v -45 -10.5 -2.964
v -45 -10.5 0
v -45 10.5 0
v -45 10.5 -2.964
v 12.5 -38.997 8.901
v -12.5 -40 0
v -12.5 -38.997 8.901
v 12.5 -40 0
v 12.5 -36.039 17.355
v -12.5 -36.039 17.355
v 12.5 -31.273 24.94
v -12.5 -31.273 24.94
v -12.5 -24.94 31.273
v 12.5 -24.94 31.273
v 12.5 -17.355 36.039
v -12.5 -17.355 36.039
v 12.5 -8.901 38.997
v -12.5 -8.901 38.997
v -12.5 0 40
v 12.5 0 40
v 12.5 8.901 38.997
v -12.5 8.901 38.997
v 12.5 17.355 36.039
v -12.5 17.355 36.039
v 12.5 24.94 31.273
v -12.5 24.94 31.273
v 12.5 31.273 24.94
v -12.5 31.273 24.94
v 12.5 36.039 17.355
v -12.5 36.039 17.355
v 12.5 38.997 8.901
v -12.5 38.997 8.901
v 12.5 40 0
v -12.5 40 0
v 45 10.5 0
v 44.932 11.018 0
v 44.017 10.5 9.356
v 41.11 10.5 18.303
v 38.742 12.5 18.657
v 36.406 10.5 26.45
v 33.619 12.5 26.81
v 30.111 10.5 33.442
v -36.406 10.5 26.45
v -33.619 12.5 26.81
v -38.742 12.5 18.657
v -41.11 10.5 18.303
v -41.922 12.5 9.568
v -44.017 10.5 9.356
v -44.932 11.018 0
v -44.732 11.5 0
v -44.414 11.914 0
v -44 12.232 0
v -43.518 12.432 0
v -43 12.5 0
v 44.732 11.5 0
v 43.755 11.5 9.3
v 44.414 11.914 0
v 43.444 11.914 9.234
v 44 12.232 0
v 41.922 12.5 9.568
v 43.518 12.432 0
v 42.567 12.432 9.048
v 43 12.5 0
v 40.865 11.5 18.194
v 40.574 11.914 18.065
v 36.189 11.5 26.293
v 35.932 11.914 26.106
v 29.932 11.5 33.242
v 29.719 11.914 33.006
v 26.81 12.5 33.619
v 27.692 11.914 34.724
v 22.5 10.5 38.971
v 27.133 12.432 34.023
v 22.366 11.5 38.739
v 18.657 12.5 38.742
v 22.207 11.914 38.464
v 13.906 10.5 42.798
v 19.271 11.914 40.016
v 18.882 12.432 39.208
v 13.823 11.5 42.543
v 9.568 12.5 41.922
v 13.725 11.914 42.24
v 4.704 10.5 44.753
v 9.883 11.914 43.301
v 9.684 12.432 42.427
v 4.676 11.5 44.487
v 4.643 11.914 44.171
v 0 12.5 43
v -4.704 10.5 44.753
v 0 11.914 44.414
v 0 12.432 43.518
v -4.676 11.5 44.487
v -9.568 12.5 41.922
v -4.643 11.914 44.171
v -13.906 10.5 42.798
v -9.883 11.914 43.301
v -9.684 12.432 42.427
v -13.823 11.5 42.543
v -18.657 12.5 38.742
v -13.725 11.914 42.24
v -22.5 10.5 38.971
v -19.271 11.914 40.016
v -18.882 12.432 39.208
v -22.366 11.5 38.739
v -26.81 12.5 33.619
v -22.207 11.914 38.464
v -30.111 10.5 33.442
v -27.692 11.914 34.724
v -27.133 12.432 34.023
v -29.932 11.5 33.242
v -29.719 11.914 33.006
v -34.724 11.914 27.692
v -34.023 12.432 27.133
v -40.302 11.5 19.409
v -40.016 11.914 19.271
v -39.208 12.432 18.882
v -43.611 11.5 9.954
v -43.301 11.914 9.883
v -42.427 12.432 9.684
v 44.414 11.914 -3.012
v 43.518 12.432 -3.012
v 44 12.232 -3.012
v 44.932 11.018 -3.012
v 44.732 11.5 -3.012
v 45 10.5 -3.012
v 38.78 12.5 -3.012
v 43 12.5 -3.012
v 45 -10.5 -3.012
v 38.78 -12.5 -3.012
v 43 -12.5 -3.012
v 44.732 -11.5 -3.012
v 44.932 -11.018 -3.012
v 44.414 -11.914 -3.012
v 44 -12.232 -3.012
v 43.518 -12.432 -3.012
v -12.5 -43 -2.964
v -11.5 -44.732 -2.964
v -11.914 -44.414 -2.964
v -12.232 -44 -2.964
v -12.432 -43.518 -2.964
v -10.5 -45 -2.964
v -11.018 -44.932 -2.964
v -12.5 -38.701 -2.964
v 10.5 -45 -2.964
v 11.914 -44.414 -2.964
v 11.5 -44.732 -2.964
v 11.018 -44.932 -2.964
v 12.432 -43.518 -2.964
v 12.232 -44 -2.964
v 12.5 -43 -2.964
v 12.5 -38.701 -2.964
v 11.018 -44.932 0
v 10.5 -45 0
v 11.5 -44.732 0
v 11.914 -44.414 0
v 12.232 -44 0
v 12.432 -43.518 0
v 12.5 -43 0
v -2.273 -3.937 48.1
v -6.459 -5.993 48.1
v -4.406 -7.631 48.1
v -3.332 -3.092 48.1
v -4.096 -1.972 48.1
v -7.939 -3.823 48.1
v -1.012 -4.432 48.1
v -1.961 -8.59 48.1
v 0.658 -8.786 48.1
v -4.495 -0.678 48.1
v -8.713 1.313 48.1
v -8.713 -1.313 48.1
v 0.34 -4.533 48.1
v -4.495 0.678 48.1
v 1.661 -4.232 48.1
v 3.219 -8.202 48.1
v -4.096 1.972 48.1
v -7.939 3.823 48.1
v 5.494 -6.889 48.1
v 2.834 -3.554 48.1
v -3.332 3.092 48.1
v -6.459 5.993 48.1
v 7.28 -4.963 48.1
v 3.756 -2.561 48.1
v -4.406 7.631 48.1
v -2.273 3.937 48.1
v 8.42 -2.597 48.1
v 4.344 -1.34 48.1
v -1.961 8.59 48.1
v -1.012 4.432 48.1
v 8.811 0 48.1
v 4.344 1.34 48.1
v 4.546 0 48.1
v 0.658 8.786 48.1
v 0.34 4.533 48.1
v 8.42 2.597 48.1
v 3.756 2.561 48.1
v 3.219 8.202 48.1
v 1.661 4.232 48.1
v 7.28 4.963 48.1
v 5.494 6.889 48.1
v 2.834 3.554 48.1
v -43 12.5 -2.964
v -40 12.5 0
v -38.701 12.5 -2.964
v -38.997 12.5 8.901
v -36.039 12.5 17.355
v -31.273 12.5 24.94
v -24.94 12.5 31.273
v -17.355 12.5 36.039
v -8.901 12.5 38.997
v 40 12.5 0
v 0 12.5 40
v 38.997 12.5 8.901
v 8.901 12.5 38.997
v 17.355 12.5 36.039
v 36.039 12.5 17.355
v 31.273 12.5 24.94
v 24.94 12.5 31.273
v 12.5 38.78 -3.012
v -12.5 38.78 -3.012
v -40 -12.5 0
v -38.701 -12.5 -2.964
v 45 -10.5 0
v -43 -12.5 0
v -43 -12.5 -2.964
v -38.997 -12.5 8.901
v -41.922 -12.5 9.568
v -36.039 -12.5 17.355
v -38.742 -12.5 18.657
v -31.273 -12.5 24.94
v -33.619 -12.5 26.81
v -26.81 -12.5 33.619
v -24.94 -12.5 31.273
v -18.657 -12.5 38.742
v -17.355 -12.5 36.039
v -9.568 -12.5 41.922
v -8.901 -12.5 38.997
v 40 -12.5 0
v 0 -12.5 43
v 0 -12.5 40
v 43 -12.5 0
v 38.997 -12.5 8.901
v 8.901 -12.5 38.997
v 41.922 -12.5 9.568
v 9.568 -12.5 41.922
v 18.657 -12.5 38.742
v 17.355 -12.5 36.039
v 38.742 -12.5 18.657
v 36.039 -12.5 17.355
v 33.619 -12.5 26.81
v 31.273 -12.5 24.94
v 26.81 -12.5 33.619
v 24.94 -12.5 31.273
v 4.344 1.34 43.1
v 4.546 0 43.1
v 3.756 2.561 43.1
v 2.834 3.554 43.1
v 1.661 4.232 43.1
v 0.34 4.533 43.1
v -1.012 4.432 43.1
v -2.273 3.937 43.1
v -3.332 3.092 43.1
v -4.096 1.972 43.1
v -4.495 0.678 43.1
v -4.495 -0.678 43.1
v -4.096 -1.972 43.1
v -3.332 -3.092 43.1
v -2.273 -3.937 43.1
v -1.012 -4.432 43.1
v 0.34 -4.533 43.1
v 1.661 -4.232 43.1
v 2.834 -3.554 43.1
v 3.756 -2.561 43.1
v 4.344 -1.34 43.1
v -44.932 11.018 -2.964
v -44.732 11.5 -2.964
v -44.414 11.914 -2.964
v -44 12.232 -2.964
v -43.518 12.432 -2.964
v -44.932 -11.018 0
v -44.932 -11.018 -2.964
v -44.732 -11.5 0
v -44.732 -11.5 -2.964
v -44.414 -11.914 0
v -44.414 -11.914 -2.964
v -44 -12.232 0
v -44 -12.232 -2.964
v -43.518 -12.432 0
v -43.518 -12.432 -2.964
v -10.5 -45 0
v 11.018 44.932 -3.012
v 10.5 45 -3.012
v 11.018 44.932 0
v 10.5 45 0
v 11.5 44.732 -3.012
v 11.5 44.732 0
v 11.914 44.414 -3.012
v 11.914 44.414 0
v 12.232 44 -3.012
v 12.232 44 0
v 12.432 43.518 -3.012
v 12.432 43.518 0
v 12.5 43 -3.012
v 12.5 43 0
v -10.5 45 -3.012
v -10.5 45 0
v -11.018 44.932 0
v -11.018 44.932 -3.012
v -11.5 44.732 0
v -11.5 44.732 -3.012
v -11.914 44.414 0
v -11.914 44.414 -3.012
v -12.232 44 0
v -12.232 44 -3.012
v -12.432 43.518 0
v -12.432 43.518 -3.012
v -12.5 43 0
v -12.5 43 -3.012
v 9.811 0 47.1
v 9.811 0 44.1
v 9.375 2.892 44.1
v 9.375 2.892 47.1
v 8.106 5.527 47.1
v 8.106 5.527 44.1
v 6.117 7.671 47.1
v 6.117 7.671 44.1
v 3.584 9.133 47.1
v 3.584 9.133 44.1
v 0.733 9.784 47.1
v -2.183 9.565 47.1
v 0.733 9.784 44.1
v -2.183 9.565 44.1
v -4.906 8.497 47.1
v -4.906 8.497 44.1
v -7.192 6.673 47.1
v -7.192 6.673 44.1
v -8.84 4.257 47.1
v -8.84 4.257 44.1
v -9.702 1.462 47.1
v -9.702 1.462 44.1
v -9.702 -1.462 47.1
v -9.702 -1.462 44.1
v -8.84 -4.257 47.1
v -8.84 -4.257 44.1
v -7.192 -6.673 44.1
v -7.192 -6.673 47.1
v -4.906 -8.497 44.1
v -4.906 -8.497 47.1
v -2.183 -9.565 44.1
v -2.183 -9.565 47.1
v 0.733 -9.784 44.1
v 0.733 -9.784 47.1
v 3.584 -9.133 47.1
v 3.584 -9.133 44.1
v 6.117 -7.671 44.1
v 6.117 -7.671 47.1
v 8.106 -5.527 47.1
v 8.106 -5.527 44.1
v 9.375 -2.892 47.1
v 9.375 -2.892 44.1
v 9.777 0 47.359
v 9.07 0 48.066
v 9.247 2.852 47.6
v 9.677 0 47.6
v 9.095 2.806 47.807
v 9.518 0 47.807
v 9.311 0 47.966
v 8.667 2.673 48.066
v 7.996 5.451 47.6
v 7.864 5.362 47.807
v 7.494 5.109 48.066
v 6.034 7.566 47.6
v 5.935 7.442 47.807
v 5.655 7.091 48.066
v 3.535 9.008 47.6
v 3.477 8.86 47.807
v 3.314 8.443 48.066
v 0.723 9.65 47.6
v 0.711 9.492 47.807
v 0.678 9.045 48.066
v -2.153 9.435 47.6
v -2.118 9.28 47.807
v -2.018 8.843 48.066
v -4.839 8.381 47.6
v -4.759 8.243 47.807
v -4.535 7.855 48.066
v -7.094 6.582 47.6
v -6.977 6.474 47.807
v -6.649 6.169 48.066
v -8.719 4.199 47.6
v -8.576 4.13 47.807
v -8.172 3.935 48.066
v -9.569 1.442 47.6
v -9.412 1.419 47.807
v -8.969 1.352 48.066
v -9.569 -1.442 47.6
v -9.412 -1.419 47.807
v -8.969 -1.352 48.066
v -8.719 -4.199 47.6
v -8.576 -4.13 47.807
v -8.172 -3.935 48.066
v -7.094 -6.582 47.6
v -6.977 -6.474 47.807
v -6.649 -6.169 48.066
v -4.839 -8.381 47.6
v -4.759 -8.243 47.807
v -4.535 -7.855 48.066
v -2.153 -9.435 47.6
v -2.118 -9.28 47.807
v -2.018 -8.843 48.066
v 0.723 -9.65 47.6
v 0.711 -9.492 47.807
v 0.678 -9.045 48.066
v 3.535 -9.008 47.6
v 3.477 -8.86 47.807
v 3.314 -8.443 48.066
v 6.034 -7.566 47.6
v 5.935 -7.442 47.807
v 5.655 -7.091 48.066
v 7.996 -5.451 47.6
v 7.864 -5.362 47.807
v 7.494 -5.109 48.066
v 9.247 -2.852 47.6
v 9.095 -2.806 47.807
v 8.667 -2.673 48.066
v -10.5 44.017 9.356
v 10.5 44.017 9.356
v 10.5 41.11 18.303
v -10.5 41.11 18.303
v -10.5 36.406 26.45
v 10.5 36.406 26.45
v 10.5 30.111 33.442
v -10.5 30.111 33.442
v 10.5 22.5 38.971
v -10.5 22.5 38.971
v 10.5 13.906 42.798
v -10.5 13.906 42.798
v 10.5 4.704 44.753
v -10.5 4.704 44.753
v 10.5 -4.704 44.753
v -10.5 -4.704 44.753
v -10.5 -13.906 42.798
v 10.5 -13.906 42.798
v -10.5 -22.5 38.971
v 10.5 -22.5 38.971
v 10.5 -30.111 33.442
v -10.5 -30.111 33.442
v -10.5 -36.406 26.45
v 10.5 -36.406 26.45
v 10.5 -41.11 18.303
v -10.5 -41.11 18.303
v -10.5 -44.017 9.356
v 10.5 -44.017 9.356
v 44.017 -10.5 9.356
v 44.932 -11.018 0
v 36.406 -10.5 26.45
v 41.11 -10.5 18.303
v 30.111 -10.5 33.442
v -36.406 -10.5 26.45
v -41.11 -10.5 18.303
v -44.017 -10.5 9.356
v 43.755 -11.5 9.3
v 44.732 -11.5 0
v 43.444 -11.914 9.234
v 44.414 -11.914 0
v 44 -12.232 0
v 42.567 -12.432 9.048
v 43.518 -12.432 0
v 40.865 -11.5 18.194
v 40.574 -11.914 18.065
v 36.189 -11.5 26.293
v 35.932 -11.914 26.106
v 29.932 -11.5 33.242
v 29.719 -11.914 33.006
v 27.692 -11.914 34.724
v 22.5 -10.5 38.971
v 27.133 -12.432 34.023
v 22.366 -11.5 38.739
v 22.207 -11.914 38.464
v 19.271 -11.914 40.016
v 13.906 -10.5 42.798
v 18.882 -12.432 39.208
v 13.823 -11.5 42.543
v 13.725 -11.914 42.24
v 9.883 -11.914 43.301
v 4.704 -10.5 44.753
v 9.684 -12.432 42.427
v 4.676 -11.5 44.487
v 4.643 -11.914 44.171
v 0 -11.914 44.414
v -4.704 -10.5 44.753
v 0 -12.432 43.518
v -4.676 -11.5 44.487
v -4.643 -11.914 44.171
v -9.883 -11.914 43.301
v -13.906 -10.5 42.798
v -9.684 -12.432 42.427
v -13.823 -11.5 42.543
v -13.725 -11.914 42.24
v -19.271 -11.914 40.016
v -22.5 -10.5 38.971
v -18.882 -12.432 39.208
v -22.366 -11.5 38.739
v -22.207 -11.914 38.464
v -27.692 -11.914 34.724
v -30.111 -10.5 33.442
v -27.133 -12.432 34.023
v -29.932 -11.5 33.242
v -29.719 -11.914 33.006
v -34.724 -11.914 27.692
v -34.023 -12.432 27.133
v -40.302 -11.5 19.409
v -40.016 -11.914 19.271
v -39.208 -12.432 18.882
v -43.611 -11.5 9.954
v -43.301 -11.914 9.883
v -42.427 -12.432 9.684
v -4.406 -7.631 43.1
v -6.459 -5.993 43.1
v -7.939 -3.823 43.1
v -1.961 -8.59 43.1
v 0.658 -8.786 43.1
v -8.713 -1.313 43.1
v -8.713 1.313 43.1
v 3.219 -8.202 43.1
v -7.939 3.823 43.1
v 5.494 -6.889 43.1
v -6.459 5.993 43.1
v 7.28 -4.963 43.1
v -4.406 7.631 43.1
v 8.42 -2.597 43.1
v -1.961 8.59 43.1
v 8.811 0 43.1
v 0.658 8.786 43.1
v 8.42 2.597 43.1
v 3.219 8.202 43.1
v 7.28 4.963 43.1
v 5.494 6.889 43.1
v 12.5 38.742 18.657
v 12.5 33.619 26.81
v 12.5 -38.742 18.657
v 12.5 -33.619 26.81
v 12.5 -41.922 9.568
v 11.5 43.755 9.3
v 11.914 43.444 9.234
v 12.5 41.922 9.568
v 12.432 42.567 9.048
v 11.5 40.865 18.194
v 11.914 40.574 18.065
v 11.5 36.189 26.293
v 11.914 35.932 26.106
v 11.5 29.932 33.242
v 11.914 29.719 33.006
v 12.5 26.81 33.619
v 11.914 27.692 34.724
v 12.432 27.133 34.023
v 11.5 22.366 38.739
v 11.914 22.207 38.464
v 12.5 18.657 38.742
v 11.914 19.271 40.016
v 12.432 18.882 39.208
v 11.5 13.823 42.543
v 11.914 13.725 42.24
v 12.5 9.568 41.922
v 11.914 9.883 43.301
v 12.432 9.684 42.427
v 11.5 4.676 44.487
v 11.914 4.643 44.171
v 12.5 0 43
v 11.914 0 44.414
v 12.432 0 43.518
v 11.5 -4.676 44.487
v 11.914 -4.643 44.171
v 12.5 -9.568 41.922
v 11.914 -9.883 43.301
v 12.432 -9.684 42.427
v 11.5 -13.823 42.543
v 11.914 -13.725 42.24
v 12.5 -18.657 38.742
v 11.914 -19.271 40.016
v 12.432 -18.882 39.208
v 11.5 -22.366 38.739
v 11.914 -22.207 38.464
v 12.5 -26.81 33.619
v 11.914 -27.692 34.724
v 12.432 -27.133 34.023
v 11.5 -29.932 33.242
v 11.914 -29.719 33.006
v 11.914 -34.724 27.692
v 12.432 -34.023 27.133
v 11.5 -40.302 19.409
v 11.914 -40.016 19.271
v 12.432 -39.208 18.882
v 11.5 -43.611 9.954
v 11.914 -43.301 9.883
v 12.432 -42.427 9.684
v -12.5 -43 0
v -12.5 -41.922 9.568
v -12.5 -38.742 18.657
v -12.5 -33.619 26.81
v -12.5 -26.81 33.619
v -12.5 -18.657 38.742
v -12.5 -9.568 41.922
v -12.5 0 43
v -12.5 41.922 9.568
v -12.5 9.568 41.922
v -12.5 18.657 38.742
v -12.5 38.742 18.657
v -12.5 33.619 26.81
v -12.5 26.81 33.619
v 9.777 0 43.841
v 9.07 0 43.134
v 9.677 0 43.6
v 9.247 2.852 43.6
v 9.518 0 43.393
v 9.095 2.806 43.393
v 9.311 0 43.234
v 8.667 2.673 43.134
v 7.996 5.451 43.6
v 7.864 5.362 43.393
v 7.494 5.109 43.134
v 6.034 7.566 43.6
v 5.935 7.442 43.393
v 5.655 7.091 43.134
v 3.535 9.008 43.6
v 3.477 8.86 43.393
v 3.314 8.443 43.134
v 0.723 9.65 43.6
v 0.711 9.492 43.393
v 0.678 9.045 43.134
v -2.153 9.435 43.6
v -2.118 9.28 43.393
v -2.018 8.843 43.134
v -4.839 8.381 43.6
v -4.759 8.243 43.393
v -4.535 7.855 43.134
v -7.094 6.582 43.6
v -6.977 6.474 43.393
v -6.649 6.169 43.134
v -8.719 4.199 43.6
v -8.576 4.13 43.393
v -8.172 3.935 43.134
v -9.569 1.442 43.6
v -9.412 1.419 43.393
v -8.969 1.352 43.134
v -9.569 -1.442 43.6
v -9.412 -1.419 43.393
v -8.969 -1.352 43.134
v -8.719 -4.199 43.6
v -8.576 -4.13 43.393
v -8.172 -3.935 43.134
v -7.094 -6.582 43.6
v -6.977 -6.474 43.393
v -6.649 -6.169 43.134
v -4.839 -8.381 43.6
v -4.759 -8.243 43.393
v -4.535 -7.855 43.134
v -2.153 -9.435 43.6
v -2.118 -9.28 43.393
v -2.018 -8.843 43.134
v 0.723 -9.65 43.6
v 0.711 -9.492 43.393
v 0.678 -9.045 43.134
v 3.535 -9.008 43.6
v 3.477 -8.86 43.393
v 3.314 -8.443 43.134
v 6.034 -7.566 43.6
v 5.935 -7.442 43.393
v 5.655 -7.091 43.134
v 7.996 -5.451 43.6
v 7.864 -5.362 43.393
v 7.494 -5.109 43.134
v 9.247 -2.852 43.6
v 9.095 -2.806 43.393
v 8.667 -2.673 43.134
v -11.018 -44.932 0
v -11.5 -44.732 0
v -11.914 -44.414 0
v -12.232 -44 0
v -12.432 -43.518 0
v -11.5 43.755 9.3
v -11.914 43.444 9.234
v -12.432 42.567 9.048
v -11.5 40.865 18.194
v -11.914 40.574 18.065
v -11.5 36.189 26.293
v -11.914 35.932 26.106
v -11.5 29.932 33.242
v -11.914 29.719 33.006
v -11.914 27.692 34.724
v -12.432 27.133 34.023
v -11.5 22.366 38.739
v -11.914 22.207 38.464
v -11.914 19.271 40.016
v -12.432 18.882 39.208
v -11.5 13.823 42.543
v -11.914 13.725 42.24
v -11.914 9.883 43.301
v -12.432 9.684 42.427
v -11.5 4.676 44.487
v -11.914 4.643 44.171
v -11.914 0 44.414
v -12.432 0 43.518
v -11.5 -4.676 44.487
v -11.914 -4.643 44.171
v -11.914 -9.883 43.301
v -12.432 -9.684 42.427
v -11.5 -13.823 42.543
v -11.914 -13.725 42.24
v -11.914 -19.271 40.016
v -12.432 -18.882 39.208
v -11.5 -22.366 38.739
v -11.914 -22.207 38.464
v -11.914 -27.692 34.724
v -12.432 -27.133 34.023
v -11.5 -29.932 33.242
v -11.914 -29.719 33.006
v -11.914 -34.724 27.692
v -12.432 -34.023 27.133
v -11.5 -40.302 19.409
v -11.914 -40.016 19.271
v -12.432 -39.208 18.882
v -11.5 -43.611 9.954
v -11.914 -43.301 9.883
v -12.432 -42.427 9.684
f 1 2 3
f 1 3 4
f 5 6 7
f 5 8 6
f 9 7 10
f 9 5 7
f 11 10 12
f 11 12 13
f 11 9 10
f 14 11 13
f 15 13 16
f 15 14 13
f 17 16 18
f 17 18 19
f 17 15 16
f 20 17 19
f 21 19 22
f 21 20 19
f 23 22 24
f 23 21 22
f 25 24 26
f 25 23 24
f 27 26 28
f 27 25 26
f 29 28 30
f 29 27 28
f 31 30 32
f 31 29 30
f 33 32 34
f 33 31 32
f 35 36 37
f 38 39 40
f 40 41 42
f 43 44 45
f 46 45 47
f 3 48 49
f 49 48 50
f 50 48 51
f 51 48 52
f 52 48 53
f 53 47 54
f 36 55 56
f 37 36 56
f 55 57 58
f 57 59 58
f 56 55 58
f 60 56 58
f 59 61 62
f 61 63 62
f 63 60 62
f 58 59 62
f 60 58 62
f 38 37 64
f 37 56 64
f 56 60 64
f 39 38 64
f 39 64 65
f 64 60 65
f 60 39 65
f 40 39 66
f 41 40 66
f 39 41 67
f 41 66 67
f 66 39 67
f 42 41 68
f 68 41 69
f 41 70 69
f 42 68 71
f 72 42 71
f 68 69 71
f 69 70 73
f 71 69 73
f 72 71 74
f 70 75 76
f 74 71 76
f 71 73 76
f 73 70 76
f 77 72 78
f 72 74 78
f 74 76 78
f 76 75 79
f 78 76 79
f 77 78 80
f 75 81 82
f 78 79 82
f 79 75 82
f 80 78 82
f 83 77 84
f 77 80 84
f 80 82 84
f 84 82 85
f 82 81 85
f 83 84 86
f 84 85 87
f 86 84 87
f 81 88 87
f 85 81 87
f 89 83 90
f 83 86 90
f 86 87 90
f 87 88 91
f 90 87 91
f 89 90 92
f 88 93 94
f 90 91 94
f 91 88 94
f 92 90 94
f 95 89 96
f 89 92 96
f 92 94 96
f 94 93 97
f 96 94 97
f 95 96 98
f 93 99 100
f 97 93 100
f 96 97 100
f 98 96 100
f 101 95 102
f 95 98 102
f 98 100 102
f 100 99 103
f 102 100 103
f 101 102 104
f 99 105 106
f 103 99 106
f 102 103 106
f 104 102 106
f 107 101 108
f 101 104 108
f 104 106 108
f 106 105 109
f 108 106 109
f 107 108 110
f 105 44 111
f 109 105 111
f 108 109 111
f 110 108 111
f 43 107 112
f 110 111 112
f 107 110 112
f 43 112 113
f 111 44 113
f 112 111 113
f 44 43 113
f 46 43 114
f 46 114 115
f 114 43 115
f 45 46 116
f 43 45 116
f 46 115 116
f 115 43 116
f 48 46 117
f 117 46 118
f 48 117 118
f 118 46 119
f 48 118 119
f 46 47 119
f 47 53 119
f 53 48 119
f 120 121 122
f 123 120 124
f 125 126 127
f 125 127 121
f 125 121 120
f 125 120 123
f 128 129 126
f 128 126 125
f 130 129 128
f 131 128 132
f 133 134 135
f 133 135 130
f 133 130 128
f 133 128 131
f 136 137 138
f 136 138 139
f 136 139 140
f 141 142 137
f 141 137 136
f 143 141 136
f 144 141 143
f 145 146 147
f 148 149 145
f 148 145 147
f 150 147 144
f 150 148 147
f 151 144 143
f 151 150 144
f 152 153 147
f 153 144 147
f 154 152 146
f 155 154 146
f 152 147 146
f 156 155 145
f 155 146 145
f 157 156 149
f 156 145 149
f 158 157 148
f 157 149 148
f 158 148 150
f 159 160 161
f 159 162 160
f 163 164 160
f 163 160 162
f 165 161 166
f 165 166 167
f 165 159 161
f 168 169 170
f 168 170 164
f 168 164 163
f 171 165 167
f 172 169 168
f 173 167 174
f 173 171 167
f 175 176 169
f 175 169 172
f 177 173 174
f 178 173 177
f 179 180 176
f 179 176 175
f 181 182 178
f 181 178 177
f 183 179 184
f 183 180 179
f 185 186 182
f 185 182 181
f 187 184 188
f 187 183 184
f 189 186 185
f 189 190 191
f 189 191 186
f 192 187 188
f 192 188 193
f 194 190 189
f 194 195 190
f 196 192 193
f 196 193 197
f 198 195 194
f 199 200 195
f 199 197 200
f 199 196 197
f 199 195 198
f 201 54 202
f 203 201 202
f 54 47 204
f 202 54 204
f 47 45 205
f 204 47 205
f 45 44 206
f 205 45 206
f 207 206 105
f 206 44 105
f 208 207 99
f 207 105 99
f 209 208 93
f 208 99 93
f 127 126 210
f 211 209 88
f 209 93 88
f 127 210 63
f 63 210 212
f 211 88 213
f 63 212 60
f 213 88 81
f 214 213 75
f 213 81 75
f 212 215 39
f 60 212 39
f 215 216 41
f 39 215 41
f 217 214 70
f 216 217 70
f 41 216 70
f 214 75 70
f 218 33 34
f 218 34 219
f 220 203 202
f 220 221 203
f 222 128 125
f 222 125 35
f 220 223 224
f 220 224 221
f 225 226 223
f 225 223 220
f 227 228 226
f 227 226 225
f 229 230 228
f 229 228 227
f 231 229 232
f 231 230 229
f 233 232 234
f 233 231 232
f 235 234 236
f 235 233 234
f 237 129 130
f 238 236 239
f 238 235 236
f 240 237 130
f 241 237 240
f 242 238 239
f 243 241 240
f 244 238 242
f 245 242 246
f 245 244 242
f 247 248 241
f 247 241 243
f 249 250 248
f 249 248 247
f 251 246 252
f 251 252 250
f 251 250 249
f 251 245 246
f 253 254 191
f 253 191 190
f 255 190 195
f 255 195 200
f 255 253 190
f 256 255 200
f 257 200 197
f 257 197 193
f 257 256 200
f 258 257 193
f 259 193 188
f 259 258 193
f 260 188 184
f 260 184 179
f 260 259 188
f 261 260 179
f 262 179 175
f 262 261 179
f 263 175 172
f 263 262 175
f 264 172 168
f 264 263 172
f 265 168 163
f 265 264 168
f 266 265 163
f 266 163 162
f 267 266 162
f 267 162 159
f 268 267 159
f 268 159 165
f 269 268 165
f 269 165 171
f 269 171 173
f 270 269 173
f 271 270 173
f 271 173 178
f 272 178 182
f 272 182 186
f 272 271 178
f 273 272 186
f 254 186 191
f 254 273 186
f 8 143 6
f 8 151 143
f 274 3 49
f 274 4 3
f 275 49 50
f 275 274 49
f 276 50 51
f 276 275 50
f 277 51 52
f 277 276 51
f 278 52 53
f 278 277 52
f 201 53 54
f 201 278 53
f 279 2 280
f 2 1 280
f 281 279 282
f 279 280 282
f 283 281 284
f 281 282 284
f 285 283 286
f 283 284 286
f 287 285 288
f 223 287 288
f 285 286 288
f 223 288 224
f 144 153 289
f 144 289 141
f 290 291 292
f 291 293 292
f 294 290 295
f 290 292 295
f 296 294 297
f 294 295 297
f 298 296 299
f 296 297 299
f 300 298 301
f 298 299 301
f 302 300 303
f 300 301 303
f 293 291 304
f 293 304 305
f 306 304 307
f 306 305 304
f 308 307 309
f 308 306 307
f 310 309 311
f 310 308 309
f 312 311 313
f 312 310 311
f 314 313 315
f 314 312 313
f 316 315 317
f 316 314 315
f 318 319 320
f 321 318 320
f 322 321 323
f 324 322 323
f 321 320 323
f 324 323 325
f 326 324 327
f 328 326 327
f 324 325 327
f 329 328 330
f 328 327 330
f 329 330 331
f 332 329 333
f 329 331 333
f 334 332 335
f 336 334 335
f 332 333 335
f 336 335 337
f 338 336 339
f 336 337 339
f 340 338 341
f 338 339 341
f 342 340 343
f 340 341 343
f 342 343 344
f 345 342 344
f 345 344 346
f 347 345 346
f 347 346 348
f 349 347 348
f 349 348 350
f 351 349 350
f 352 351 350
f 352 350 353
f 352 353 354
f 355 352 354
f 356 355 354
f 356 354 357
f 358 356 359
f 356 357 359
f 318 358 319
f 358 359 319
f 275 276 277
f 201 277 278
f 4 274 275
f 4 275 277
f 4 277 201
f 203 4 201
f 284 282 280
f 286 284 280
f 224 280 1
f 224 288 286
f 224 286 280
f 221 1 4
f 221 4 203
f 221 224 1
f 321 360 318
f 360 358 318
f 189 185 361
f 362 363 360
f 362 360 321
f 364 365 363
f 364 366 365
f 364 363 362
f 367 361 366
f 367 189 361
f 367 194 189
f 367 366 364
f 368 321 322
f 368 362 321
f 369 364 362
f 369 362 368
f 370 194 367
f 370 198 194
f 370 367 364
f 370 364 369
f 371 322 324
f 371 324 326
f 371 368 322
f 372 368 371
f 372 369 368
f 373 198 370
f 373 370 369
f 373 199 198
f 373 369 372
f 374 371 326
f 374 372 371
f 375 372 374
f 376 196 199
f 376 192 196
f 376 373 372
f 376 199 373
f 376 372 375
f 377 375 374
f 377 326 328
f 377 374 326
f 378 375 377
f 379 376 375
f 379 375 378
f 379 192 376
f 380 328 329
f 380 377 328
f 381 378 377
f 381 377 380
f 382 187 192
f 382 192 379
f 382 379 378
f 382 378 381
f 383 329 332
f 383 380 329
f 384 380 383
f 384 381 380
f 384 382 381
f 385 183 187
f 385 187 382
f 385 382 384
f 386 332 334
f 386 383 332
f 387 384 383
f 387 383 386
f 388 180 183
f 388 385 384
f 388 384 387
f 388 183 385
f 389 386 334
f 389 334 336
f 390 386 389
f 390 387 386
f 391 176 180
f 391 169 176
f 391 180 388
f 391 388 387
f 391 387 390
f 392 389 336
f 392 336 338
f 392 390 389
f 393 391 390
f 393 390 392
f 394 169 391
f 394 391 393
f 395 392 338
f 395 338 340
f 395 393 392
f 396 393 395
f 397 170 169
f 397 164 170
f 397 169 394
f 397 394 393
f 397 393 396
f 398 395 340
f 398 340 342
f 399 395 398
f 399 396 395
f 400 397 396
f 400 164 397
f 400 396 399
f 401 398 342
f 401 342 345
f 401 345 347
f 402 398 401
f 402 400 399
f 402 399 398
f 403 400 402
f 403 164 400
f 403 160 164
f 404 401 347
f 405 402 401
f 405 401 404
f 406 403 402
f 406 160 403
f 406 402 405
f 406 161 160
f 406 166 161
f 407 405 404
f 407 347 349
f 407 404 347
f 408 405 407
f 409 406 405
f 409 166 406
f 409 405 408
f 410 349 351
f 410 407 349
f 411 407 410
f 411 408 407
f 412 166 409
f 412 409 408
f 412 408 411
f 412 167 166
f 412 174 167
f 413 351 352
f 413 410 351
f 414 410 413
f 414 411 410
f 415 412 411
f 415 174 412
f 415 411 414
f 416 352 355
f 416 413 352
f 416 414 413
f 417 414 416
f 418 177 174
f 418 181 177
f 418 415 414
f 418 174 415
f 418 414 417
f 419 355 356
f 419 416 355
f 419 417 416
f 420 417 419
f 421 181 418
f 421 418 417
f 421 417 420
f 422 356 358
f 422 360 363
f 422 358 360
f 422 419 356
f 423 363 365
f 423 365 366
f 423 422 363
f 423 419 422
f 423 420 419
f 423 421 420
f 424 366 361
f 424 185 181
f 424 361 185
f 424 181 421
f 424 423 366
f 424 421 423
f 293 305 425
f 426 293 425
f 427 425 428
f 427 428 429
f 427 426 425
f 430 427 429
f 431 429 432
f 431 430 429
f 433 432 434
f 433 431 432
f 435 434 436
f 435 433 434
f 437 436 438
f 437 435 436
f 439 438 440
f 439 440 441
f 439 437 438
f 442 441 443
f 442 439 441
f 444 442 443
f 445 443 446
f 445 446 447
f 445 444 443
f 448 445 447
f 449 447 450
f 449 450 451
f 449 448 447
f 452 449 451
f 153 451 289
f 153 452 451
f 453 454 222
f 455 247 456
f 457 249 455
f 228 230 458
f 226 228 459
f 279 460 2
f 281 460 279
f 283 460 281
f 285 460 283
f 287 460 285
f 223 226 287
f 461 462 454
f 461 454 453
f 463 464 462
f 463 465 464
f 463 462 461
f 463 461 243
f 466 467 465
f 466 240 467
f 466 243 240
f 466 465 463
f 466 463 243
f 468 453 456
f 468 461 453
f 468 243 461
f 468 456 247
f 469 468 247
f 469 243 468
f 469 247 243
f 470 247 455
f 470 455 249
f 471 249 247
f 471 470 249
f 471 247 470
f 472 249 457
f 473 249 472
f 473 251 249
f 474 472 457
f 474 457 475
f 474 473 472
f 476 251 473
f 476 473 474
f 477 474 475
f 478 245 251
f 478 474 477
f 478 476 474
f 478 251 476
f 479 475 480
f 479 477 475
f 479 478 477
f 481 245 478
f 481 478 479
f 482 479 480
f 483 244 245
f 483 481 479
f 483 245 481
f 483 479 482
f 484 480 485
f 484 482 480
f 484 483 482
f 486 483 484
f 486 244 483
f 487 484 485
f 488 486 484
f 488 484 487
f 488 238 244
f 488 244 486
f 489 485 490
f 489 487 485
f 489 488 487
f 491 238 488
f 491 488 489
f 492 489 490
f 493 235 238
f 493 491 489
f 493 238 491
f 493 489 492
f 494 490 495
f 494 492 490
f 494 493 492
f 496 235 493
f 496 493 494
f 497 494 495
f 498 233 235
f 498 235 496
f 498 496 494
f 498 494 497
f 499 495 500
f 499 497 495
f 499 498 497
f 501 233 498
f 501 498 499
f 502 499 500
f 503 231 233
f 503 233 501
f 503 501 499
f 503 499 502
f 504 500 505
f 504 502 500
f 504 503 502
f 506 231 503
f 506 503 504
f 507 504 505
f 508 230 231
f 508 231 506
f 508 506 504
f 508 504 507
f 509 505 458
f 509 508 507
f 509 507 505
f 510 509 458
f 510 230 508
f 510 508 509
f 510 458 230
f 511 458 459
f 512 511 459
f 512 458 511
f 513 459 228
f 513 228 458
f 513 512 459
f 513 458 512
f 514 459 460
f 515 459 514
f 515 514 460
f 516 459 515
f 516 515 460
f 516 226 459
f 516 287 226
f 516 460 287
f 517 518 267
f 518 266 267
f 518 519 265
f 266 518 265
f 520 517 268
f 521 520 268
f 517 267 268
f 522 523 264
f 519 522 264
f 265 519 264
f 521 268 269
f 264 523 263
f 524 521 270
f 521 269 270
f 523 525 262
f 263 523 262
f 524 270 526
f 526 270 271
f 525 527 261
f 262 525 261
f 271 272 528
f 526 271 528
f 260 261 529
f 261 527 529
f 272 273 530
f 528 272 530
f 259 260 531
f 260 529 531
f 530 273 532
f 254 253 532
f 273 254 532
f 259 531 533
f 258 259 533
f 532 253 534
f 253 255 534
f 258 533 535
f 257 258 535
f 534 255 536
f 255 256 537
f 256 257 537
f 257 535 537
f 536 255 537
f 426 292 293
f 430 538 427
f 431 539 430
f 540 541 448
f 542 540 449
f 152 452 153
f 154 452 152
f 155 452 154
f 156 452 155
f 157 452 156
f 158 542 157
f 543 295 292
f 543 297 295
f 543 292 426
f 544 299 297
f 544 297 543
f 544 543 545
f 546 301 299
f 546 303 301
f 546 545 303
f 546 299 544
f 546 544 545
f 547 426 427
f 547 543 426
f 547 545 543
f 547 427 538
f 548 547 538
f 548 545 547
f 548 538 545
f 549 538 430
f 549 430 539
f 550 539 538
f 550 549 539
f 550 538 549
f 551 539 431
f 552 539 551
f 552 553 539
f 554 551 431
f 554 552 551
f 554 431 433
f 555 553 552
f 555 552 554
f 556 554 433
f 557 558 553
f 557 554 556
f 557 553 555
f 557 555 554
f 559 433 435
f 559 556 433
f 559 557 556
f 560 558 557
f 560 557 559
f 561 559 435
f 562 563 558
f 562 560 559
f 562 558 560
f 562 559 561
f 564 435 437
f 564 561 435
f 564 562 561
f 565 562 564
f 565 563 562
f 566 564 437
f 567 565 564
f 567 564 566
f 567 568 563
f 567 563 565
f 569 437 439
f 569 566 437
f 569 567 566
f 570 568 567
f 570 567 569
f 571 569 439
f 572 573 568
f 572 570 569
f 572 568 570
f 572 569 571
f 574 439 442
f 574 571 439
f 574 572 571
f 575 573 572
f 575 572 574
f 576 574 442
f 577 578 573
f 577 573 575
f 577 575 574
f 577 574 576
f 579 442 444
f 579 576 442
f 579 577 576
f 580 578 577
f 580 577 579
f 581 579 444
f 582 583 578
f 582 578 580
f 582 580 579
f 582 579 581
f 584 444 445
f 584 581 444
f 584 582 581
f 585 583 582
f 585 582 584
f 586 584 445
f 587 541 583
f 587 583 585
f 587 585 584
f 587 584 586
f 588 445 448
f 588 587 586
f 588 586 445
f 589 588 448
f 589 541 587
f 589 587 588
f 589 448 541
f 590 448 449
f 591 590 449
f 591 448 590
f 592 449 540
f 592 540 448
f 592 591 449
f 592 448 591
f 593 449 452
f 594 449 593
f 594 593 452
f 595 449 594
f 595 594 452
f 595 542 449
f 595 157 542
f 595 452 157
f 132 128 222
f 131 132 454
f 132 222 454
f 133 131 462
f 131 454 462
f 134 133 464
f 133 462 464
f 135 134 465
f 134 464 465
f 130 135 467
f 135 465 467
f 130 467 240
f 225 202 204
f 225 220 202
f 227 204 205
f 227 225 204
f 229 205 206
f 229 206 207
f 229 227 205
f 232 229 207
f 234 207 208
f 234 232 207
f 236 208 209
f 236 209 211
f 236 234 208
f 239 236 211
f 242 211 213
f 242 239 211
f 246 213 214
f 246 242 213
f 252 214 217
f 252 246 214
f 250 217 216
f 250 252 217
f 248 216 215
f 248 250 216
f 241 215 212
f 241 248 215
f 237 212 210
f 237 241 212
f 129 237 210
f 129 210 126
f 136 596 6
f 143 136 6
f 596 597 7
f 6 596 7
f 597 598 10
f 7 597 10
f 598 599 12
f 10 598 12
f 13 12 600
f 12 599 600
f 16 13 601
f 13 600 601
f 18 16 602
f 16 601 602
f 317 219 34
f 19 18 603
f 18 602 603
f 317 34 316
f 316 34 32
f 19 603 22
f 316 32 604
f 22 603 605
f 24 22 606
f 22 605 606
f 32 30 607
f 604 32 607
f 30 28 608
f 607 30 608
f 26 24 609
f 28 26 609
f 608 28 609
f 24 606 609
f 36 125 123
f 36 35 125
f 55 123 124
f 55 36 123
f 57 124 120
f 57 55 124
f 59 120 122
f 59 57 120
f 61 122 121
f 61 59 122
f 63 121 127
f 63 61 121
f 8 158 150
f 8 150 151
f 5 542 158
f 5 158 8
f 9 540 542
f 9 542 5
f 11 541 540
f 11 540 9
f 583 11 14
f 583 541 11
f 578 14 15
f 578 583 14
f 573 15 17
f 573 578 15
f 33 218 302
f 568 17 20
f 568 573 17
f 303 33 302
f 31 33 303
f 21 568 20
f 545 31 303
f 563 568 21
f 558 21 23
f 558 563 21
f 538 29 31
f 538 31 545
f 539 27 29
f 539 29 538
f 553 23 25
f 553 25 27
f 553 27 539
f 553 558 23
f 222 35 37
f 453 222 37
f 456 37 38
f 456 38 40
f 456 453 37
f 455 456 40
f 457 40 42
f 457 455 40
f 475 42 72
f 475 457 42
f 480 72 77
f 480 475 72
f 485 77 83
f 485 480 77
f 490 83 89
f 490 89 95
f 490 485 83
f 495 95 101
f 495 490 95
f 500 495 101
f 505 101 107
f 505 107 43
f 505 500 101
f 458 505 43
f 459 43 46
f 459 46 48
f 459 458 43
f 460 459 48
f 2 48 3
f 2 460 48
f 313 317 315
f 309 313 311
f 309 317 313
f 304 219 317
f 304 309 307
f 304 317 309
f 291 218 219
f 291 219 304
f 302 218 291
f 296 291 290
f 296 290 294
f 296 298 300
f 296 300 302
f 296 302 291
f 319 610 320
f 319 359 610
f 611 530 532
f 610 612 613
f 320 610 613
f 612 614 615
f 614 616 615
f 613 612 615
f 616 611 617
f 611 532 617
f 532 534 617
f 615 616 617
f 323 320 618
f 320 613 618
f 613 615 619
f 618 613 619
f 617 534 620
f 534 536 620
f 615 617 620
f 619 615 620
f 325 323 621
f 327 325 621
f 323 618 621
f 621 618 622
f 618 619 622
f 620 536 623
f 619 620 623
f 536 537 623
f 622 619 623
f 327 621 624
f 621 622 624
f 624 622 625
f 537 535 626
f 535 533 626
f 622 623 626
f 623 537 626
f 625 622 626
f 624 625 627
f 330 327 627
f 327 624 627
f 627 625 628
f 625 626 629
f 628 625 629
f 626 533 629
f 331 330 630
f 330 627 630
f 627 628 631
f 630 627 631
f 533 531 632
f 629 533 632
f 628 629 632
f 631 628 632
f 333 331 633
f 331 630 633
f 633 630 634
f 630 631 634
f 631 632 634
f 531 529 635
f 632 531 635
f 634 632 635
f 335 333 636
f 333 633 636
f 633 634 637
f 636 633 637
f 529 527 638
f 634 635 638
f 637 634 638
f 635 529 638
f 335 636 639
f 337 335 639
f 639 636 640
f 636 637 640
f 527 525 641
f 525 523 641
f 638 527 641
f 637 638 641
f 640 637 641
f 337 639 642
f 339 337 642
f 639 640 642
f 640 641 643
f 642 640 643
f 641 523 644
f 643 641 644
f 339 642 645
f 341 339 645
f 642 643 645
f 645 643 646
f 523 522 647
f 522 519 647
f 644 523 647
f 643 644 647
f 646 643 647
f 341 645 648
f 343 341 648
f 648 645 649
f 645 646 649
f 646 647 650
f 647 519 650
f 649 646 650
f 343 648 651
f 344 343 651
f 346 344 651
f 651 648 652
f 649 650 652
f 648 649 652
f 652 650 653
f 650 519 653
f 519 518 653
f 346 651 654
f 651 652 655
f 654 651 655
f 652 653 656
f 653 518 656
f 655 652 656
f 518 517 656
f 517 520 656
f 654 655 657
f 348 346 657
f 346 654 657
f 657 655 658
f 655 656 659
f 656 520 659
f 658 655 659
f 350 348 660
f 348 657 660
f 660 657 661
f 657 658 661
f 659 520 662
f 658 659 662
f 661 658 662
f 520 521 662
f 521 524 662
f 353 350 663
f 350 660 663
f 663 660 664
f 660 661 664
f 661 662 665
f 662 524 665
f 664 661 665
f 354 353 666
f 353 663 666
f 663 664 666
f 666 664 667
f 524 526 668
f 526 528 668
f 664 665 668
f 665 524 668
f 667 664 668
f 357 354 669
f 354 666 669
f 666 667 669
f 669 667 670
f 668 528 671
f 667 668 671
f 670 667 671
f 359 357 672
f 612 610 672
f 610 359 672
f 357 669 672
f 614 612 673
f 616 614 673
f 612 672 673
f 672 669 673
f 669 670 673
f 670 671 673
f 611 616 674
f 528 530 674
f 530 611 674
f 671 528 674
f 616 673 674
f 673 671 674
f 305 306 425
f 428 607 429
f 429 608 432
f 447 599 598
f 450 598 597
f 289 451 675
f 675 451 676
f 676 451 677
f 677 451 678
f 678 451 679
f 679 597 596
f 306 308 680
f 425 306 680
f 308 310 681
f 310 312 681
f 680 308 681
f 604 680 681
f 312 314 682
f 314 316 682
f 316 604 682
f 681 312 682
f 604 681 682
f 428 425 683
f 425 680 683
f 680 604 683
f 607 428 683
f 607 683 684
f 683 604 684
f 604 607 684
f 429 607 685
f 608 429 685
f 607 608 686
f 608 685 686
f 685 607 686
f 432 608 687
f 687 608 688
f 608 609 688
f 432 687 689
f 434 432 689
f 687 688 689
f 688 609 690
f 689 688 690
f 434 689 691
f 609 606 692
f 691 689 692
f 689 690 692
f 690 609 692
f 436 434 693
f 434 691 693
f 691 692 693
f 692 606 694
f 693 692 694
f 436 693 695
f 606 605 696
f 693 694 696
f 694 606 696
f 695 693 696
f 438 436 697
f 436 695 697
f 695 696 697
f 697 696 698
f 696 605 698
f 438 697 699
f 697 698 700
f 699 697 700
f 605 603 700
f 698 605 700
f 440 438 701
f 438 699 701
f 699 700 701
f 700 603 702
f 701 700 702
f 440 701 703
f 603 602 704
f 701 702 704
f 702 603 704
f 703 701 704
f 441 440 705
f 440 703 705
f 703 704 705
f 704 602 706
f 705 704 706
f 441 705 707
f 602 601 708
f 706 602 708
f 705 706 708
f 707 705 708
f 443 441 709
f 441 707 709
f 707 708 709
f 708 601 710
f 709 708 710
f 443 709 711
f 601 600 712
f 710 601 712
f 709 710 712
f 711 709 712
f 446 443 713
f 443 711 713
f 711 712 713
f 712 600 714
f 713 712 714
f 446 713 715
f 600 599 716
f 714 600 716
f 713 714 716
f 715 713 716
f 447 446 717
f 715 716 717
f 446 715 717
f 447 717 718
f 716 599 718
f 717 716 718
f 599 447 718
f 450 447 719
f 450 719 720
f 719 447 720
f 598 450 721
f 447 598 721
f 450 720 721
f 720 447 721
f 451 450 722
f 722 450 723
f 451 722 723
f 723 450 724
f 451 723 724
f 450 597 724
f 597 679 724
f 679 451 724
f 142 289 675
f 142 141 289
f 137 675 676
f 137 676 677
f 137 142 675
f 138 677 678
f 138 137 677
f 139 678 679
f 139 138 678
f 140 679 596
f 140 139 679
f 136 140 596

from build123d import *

# Parameters (mm, degrees)
F1_DEPTH = 12.5
F4_ANGLE = 90
F5_R     = 2
F5_2_R   = 2
F6_R     = 9.811106596
F6_R_2   = 4.5458259895
F7_DEPTH = 5
F8_R     = 1


with BuildPart() as f1:
    # F0 (on Front) → F1 (new body, symmetric)
    with BuildSketch(Plane.XZ):
        with BuildLine():
            ThreePointArc((-40, 0), (0, 40), (40, 0))
            Line((40, 0), (38.7801602483, -3.0118847469))
            Line((38.7801602483, -3.0118847469), (45, -3.0118847469))
            Line((45, -3.0118847469), (45, 0))
            ThreePointArc((45, 0), (0, 45), (-45, 0))
            Line((-45, 0), (-45, -2.9643927701))
            Line((-45, -2.9643927701), (-38.7012884021, -2.9643927701))
            Line((-38.7012884021, -2.9643927701), (-40, 0))
        make_face()
    extrude(amount=F1_DEPTH, both=True)


with BuildPart() as f4_1:
    # F4: copy of F1
    add(f1.part.rotate(Axis((0, 0, 43.1), (0, 0, 1)), F4_ANGLE))

    # F5#2
    f5_2_edges = [f4_1.edges().sort_by_distance(p)[0] for p in [
        (0, 45, 0),
        (-12.5, 0, 45),
        (0, -45, 0),
        (12.5, 0, 45),
        (-12.5, -45, -1.482196),
        (12.5, -45, -1.482196),
        (-12.5, 45, -1.505942),
        (12.5, 45, -1.505942),
    ]]
    fillet(f5_2_edges, radius=F5_2_R)


with BuildPart() as f1_1:
    add(f1.part)

    # F5
    f5_edges = [f1_1.edges().sort_by_distance(p)[0] for p in [
        (0, -12.5, 45),
        (0, 12.5, 45),
        (-45, 12.5, -1.482196),
        (-45, -12.5, -1.482196),
        (45, 12.5, -1.505942),
        (45, -12.5, -1.505942),
    ]]
    fillet(f5_edges, radius=F5_R)


with BuildPart() as f7:
    # F6 (on offset) → F7 (new body)
    with BuildSketch(Plane.XY.offset(43.1)):
        Circle(F6_R)
        Circle(F6_R_2, mode=Mode.SUBTRACT)
    extrude(amount=F7_DEPTH)

    # F8
    f8_edges = [f7.edges().sort_by_distance(p)[0] for p in [
        (9.811107, 0, 45.6),
        (-9.811107, 0, 43.1),
        (-9.811107, 0, 48.1),
    ]]
    fillet(f8_edges, radius=F8_R)


solid = Compound([f4_1.part, f1_1.part, f7.part])
